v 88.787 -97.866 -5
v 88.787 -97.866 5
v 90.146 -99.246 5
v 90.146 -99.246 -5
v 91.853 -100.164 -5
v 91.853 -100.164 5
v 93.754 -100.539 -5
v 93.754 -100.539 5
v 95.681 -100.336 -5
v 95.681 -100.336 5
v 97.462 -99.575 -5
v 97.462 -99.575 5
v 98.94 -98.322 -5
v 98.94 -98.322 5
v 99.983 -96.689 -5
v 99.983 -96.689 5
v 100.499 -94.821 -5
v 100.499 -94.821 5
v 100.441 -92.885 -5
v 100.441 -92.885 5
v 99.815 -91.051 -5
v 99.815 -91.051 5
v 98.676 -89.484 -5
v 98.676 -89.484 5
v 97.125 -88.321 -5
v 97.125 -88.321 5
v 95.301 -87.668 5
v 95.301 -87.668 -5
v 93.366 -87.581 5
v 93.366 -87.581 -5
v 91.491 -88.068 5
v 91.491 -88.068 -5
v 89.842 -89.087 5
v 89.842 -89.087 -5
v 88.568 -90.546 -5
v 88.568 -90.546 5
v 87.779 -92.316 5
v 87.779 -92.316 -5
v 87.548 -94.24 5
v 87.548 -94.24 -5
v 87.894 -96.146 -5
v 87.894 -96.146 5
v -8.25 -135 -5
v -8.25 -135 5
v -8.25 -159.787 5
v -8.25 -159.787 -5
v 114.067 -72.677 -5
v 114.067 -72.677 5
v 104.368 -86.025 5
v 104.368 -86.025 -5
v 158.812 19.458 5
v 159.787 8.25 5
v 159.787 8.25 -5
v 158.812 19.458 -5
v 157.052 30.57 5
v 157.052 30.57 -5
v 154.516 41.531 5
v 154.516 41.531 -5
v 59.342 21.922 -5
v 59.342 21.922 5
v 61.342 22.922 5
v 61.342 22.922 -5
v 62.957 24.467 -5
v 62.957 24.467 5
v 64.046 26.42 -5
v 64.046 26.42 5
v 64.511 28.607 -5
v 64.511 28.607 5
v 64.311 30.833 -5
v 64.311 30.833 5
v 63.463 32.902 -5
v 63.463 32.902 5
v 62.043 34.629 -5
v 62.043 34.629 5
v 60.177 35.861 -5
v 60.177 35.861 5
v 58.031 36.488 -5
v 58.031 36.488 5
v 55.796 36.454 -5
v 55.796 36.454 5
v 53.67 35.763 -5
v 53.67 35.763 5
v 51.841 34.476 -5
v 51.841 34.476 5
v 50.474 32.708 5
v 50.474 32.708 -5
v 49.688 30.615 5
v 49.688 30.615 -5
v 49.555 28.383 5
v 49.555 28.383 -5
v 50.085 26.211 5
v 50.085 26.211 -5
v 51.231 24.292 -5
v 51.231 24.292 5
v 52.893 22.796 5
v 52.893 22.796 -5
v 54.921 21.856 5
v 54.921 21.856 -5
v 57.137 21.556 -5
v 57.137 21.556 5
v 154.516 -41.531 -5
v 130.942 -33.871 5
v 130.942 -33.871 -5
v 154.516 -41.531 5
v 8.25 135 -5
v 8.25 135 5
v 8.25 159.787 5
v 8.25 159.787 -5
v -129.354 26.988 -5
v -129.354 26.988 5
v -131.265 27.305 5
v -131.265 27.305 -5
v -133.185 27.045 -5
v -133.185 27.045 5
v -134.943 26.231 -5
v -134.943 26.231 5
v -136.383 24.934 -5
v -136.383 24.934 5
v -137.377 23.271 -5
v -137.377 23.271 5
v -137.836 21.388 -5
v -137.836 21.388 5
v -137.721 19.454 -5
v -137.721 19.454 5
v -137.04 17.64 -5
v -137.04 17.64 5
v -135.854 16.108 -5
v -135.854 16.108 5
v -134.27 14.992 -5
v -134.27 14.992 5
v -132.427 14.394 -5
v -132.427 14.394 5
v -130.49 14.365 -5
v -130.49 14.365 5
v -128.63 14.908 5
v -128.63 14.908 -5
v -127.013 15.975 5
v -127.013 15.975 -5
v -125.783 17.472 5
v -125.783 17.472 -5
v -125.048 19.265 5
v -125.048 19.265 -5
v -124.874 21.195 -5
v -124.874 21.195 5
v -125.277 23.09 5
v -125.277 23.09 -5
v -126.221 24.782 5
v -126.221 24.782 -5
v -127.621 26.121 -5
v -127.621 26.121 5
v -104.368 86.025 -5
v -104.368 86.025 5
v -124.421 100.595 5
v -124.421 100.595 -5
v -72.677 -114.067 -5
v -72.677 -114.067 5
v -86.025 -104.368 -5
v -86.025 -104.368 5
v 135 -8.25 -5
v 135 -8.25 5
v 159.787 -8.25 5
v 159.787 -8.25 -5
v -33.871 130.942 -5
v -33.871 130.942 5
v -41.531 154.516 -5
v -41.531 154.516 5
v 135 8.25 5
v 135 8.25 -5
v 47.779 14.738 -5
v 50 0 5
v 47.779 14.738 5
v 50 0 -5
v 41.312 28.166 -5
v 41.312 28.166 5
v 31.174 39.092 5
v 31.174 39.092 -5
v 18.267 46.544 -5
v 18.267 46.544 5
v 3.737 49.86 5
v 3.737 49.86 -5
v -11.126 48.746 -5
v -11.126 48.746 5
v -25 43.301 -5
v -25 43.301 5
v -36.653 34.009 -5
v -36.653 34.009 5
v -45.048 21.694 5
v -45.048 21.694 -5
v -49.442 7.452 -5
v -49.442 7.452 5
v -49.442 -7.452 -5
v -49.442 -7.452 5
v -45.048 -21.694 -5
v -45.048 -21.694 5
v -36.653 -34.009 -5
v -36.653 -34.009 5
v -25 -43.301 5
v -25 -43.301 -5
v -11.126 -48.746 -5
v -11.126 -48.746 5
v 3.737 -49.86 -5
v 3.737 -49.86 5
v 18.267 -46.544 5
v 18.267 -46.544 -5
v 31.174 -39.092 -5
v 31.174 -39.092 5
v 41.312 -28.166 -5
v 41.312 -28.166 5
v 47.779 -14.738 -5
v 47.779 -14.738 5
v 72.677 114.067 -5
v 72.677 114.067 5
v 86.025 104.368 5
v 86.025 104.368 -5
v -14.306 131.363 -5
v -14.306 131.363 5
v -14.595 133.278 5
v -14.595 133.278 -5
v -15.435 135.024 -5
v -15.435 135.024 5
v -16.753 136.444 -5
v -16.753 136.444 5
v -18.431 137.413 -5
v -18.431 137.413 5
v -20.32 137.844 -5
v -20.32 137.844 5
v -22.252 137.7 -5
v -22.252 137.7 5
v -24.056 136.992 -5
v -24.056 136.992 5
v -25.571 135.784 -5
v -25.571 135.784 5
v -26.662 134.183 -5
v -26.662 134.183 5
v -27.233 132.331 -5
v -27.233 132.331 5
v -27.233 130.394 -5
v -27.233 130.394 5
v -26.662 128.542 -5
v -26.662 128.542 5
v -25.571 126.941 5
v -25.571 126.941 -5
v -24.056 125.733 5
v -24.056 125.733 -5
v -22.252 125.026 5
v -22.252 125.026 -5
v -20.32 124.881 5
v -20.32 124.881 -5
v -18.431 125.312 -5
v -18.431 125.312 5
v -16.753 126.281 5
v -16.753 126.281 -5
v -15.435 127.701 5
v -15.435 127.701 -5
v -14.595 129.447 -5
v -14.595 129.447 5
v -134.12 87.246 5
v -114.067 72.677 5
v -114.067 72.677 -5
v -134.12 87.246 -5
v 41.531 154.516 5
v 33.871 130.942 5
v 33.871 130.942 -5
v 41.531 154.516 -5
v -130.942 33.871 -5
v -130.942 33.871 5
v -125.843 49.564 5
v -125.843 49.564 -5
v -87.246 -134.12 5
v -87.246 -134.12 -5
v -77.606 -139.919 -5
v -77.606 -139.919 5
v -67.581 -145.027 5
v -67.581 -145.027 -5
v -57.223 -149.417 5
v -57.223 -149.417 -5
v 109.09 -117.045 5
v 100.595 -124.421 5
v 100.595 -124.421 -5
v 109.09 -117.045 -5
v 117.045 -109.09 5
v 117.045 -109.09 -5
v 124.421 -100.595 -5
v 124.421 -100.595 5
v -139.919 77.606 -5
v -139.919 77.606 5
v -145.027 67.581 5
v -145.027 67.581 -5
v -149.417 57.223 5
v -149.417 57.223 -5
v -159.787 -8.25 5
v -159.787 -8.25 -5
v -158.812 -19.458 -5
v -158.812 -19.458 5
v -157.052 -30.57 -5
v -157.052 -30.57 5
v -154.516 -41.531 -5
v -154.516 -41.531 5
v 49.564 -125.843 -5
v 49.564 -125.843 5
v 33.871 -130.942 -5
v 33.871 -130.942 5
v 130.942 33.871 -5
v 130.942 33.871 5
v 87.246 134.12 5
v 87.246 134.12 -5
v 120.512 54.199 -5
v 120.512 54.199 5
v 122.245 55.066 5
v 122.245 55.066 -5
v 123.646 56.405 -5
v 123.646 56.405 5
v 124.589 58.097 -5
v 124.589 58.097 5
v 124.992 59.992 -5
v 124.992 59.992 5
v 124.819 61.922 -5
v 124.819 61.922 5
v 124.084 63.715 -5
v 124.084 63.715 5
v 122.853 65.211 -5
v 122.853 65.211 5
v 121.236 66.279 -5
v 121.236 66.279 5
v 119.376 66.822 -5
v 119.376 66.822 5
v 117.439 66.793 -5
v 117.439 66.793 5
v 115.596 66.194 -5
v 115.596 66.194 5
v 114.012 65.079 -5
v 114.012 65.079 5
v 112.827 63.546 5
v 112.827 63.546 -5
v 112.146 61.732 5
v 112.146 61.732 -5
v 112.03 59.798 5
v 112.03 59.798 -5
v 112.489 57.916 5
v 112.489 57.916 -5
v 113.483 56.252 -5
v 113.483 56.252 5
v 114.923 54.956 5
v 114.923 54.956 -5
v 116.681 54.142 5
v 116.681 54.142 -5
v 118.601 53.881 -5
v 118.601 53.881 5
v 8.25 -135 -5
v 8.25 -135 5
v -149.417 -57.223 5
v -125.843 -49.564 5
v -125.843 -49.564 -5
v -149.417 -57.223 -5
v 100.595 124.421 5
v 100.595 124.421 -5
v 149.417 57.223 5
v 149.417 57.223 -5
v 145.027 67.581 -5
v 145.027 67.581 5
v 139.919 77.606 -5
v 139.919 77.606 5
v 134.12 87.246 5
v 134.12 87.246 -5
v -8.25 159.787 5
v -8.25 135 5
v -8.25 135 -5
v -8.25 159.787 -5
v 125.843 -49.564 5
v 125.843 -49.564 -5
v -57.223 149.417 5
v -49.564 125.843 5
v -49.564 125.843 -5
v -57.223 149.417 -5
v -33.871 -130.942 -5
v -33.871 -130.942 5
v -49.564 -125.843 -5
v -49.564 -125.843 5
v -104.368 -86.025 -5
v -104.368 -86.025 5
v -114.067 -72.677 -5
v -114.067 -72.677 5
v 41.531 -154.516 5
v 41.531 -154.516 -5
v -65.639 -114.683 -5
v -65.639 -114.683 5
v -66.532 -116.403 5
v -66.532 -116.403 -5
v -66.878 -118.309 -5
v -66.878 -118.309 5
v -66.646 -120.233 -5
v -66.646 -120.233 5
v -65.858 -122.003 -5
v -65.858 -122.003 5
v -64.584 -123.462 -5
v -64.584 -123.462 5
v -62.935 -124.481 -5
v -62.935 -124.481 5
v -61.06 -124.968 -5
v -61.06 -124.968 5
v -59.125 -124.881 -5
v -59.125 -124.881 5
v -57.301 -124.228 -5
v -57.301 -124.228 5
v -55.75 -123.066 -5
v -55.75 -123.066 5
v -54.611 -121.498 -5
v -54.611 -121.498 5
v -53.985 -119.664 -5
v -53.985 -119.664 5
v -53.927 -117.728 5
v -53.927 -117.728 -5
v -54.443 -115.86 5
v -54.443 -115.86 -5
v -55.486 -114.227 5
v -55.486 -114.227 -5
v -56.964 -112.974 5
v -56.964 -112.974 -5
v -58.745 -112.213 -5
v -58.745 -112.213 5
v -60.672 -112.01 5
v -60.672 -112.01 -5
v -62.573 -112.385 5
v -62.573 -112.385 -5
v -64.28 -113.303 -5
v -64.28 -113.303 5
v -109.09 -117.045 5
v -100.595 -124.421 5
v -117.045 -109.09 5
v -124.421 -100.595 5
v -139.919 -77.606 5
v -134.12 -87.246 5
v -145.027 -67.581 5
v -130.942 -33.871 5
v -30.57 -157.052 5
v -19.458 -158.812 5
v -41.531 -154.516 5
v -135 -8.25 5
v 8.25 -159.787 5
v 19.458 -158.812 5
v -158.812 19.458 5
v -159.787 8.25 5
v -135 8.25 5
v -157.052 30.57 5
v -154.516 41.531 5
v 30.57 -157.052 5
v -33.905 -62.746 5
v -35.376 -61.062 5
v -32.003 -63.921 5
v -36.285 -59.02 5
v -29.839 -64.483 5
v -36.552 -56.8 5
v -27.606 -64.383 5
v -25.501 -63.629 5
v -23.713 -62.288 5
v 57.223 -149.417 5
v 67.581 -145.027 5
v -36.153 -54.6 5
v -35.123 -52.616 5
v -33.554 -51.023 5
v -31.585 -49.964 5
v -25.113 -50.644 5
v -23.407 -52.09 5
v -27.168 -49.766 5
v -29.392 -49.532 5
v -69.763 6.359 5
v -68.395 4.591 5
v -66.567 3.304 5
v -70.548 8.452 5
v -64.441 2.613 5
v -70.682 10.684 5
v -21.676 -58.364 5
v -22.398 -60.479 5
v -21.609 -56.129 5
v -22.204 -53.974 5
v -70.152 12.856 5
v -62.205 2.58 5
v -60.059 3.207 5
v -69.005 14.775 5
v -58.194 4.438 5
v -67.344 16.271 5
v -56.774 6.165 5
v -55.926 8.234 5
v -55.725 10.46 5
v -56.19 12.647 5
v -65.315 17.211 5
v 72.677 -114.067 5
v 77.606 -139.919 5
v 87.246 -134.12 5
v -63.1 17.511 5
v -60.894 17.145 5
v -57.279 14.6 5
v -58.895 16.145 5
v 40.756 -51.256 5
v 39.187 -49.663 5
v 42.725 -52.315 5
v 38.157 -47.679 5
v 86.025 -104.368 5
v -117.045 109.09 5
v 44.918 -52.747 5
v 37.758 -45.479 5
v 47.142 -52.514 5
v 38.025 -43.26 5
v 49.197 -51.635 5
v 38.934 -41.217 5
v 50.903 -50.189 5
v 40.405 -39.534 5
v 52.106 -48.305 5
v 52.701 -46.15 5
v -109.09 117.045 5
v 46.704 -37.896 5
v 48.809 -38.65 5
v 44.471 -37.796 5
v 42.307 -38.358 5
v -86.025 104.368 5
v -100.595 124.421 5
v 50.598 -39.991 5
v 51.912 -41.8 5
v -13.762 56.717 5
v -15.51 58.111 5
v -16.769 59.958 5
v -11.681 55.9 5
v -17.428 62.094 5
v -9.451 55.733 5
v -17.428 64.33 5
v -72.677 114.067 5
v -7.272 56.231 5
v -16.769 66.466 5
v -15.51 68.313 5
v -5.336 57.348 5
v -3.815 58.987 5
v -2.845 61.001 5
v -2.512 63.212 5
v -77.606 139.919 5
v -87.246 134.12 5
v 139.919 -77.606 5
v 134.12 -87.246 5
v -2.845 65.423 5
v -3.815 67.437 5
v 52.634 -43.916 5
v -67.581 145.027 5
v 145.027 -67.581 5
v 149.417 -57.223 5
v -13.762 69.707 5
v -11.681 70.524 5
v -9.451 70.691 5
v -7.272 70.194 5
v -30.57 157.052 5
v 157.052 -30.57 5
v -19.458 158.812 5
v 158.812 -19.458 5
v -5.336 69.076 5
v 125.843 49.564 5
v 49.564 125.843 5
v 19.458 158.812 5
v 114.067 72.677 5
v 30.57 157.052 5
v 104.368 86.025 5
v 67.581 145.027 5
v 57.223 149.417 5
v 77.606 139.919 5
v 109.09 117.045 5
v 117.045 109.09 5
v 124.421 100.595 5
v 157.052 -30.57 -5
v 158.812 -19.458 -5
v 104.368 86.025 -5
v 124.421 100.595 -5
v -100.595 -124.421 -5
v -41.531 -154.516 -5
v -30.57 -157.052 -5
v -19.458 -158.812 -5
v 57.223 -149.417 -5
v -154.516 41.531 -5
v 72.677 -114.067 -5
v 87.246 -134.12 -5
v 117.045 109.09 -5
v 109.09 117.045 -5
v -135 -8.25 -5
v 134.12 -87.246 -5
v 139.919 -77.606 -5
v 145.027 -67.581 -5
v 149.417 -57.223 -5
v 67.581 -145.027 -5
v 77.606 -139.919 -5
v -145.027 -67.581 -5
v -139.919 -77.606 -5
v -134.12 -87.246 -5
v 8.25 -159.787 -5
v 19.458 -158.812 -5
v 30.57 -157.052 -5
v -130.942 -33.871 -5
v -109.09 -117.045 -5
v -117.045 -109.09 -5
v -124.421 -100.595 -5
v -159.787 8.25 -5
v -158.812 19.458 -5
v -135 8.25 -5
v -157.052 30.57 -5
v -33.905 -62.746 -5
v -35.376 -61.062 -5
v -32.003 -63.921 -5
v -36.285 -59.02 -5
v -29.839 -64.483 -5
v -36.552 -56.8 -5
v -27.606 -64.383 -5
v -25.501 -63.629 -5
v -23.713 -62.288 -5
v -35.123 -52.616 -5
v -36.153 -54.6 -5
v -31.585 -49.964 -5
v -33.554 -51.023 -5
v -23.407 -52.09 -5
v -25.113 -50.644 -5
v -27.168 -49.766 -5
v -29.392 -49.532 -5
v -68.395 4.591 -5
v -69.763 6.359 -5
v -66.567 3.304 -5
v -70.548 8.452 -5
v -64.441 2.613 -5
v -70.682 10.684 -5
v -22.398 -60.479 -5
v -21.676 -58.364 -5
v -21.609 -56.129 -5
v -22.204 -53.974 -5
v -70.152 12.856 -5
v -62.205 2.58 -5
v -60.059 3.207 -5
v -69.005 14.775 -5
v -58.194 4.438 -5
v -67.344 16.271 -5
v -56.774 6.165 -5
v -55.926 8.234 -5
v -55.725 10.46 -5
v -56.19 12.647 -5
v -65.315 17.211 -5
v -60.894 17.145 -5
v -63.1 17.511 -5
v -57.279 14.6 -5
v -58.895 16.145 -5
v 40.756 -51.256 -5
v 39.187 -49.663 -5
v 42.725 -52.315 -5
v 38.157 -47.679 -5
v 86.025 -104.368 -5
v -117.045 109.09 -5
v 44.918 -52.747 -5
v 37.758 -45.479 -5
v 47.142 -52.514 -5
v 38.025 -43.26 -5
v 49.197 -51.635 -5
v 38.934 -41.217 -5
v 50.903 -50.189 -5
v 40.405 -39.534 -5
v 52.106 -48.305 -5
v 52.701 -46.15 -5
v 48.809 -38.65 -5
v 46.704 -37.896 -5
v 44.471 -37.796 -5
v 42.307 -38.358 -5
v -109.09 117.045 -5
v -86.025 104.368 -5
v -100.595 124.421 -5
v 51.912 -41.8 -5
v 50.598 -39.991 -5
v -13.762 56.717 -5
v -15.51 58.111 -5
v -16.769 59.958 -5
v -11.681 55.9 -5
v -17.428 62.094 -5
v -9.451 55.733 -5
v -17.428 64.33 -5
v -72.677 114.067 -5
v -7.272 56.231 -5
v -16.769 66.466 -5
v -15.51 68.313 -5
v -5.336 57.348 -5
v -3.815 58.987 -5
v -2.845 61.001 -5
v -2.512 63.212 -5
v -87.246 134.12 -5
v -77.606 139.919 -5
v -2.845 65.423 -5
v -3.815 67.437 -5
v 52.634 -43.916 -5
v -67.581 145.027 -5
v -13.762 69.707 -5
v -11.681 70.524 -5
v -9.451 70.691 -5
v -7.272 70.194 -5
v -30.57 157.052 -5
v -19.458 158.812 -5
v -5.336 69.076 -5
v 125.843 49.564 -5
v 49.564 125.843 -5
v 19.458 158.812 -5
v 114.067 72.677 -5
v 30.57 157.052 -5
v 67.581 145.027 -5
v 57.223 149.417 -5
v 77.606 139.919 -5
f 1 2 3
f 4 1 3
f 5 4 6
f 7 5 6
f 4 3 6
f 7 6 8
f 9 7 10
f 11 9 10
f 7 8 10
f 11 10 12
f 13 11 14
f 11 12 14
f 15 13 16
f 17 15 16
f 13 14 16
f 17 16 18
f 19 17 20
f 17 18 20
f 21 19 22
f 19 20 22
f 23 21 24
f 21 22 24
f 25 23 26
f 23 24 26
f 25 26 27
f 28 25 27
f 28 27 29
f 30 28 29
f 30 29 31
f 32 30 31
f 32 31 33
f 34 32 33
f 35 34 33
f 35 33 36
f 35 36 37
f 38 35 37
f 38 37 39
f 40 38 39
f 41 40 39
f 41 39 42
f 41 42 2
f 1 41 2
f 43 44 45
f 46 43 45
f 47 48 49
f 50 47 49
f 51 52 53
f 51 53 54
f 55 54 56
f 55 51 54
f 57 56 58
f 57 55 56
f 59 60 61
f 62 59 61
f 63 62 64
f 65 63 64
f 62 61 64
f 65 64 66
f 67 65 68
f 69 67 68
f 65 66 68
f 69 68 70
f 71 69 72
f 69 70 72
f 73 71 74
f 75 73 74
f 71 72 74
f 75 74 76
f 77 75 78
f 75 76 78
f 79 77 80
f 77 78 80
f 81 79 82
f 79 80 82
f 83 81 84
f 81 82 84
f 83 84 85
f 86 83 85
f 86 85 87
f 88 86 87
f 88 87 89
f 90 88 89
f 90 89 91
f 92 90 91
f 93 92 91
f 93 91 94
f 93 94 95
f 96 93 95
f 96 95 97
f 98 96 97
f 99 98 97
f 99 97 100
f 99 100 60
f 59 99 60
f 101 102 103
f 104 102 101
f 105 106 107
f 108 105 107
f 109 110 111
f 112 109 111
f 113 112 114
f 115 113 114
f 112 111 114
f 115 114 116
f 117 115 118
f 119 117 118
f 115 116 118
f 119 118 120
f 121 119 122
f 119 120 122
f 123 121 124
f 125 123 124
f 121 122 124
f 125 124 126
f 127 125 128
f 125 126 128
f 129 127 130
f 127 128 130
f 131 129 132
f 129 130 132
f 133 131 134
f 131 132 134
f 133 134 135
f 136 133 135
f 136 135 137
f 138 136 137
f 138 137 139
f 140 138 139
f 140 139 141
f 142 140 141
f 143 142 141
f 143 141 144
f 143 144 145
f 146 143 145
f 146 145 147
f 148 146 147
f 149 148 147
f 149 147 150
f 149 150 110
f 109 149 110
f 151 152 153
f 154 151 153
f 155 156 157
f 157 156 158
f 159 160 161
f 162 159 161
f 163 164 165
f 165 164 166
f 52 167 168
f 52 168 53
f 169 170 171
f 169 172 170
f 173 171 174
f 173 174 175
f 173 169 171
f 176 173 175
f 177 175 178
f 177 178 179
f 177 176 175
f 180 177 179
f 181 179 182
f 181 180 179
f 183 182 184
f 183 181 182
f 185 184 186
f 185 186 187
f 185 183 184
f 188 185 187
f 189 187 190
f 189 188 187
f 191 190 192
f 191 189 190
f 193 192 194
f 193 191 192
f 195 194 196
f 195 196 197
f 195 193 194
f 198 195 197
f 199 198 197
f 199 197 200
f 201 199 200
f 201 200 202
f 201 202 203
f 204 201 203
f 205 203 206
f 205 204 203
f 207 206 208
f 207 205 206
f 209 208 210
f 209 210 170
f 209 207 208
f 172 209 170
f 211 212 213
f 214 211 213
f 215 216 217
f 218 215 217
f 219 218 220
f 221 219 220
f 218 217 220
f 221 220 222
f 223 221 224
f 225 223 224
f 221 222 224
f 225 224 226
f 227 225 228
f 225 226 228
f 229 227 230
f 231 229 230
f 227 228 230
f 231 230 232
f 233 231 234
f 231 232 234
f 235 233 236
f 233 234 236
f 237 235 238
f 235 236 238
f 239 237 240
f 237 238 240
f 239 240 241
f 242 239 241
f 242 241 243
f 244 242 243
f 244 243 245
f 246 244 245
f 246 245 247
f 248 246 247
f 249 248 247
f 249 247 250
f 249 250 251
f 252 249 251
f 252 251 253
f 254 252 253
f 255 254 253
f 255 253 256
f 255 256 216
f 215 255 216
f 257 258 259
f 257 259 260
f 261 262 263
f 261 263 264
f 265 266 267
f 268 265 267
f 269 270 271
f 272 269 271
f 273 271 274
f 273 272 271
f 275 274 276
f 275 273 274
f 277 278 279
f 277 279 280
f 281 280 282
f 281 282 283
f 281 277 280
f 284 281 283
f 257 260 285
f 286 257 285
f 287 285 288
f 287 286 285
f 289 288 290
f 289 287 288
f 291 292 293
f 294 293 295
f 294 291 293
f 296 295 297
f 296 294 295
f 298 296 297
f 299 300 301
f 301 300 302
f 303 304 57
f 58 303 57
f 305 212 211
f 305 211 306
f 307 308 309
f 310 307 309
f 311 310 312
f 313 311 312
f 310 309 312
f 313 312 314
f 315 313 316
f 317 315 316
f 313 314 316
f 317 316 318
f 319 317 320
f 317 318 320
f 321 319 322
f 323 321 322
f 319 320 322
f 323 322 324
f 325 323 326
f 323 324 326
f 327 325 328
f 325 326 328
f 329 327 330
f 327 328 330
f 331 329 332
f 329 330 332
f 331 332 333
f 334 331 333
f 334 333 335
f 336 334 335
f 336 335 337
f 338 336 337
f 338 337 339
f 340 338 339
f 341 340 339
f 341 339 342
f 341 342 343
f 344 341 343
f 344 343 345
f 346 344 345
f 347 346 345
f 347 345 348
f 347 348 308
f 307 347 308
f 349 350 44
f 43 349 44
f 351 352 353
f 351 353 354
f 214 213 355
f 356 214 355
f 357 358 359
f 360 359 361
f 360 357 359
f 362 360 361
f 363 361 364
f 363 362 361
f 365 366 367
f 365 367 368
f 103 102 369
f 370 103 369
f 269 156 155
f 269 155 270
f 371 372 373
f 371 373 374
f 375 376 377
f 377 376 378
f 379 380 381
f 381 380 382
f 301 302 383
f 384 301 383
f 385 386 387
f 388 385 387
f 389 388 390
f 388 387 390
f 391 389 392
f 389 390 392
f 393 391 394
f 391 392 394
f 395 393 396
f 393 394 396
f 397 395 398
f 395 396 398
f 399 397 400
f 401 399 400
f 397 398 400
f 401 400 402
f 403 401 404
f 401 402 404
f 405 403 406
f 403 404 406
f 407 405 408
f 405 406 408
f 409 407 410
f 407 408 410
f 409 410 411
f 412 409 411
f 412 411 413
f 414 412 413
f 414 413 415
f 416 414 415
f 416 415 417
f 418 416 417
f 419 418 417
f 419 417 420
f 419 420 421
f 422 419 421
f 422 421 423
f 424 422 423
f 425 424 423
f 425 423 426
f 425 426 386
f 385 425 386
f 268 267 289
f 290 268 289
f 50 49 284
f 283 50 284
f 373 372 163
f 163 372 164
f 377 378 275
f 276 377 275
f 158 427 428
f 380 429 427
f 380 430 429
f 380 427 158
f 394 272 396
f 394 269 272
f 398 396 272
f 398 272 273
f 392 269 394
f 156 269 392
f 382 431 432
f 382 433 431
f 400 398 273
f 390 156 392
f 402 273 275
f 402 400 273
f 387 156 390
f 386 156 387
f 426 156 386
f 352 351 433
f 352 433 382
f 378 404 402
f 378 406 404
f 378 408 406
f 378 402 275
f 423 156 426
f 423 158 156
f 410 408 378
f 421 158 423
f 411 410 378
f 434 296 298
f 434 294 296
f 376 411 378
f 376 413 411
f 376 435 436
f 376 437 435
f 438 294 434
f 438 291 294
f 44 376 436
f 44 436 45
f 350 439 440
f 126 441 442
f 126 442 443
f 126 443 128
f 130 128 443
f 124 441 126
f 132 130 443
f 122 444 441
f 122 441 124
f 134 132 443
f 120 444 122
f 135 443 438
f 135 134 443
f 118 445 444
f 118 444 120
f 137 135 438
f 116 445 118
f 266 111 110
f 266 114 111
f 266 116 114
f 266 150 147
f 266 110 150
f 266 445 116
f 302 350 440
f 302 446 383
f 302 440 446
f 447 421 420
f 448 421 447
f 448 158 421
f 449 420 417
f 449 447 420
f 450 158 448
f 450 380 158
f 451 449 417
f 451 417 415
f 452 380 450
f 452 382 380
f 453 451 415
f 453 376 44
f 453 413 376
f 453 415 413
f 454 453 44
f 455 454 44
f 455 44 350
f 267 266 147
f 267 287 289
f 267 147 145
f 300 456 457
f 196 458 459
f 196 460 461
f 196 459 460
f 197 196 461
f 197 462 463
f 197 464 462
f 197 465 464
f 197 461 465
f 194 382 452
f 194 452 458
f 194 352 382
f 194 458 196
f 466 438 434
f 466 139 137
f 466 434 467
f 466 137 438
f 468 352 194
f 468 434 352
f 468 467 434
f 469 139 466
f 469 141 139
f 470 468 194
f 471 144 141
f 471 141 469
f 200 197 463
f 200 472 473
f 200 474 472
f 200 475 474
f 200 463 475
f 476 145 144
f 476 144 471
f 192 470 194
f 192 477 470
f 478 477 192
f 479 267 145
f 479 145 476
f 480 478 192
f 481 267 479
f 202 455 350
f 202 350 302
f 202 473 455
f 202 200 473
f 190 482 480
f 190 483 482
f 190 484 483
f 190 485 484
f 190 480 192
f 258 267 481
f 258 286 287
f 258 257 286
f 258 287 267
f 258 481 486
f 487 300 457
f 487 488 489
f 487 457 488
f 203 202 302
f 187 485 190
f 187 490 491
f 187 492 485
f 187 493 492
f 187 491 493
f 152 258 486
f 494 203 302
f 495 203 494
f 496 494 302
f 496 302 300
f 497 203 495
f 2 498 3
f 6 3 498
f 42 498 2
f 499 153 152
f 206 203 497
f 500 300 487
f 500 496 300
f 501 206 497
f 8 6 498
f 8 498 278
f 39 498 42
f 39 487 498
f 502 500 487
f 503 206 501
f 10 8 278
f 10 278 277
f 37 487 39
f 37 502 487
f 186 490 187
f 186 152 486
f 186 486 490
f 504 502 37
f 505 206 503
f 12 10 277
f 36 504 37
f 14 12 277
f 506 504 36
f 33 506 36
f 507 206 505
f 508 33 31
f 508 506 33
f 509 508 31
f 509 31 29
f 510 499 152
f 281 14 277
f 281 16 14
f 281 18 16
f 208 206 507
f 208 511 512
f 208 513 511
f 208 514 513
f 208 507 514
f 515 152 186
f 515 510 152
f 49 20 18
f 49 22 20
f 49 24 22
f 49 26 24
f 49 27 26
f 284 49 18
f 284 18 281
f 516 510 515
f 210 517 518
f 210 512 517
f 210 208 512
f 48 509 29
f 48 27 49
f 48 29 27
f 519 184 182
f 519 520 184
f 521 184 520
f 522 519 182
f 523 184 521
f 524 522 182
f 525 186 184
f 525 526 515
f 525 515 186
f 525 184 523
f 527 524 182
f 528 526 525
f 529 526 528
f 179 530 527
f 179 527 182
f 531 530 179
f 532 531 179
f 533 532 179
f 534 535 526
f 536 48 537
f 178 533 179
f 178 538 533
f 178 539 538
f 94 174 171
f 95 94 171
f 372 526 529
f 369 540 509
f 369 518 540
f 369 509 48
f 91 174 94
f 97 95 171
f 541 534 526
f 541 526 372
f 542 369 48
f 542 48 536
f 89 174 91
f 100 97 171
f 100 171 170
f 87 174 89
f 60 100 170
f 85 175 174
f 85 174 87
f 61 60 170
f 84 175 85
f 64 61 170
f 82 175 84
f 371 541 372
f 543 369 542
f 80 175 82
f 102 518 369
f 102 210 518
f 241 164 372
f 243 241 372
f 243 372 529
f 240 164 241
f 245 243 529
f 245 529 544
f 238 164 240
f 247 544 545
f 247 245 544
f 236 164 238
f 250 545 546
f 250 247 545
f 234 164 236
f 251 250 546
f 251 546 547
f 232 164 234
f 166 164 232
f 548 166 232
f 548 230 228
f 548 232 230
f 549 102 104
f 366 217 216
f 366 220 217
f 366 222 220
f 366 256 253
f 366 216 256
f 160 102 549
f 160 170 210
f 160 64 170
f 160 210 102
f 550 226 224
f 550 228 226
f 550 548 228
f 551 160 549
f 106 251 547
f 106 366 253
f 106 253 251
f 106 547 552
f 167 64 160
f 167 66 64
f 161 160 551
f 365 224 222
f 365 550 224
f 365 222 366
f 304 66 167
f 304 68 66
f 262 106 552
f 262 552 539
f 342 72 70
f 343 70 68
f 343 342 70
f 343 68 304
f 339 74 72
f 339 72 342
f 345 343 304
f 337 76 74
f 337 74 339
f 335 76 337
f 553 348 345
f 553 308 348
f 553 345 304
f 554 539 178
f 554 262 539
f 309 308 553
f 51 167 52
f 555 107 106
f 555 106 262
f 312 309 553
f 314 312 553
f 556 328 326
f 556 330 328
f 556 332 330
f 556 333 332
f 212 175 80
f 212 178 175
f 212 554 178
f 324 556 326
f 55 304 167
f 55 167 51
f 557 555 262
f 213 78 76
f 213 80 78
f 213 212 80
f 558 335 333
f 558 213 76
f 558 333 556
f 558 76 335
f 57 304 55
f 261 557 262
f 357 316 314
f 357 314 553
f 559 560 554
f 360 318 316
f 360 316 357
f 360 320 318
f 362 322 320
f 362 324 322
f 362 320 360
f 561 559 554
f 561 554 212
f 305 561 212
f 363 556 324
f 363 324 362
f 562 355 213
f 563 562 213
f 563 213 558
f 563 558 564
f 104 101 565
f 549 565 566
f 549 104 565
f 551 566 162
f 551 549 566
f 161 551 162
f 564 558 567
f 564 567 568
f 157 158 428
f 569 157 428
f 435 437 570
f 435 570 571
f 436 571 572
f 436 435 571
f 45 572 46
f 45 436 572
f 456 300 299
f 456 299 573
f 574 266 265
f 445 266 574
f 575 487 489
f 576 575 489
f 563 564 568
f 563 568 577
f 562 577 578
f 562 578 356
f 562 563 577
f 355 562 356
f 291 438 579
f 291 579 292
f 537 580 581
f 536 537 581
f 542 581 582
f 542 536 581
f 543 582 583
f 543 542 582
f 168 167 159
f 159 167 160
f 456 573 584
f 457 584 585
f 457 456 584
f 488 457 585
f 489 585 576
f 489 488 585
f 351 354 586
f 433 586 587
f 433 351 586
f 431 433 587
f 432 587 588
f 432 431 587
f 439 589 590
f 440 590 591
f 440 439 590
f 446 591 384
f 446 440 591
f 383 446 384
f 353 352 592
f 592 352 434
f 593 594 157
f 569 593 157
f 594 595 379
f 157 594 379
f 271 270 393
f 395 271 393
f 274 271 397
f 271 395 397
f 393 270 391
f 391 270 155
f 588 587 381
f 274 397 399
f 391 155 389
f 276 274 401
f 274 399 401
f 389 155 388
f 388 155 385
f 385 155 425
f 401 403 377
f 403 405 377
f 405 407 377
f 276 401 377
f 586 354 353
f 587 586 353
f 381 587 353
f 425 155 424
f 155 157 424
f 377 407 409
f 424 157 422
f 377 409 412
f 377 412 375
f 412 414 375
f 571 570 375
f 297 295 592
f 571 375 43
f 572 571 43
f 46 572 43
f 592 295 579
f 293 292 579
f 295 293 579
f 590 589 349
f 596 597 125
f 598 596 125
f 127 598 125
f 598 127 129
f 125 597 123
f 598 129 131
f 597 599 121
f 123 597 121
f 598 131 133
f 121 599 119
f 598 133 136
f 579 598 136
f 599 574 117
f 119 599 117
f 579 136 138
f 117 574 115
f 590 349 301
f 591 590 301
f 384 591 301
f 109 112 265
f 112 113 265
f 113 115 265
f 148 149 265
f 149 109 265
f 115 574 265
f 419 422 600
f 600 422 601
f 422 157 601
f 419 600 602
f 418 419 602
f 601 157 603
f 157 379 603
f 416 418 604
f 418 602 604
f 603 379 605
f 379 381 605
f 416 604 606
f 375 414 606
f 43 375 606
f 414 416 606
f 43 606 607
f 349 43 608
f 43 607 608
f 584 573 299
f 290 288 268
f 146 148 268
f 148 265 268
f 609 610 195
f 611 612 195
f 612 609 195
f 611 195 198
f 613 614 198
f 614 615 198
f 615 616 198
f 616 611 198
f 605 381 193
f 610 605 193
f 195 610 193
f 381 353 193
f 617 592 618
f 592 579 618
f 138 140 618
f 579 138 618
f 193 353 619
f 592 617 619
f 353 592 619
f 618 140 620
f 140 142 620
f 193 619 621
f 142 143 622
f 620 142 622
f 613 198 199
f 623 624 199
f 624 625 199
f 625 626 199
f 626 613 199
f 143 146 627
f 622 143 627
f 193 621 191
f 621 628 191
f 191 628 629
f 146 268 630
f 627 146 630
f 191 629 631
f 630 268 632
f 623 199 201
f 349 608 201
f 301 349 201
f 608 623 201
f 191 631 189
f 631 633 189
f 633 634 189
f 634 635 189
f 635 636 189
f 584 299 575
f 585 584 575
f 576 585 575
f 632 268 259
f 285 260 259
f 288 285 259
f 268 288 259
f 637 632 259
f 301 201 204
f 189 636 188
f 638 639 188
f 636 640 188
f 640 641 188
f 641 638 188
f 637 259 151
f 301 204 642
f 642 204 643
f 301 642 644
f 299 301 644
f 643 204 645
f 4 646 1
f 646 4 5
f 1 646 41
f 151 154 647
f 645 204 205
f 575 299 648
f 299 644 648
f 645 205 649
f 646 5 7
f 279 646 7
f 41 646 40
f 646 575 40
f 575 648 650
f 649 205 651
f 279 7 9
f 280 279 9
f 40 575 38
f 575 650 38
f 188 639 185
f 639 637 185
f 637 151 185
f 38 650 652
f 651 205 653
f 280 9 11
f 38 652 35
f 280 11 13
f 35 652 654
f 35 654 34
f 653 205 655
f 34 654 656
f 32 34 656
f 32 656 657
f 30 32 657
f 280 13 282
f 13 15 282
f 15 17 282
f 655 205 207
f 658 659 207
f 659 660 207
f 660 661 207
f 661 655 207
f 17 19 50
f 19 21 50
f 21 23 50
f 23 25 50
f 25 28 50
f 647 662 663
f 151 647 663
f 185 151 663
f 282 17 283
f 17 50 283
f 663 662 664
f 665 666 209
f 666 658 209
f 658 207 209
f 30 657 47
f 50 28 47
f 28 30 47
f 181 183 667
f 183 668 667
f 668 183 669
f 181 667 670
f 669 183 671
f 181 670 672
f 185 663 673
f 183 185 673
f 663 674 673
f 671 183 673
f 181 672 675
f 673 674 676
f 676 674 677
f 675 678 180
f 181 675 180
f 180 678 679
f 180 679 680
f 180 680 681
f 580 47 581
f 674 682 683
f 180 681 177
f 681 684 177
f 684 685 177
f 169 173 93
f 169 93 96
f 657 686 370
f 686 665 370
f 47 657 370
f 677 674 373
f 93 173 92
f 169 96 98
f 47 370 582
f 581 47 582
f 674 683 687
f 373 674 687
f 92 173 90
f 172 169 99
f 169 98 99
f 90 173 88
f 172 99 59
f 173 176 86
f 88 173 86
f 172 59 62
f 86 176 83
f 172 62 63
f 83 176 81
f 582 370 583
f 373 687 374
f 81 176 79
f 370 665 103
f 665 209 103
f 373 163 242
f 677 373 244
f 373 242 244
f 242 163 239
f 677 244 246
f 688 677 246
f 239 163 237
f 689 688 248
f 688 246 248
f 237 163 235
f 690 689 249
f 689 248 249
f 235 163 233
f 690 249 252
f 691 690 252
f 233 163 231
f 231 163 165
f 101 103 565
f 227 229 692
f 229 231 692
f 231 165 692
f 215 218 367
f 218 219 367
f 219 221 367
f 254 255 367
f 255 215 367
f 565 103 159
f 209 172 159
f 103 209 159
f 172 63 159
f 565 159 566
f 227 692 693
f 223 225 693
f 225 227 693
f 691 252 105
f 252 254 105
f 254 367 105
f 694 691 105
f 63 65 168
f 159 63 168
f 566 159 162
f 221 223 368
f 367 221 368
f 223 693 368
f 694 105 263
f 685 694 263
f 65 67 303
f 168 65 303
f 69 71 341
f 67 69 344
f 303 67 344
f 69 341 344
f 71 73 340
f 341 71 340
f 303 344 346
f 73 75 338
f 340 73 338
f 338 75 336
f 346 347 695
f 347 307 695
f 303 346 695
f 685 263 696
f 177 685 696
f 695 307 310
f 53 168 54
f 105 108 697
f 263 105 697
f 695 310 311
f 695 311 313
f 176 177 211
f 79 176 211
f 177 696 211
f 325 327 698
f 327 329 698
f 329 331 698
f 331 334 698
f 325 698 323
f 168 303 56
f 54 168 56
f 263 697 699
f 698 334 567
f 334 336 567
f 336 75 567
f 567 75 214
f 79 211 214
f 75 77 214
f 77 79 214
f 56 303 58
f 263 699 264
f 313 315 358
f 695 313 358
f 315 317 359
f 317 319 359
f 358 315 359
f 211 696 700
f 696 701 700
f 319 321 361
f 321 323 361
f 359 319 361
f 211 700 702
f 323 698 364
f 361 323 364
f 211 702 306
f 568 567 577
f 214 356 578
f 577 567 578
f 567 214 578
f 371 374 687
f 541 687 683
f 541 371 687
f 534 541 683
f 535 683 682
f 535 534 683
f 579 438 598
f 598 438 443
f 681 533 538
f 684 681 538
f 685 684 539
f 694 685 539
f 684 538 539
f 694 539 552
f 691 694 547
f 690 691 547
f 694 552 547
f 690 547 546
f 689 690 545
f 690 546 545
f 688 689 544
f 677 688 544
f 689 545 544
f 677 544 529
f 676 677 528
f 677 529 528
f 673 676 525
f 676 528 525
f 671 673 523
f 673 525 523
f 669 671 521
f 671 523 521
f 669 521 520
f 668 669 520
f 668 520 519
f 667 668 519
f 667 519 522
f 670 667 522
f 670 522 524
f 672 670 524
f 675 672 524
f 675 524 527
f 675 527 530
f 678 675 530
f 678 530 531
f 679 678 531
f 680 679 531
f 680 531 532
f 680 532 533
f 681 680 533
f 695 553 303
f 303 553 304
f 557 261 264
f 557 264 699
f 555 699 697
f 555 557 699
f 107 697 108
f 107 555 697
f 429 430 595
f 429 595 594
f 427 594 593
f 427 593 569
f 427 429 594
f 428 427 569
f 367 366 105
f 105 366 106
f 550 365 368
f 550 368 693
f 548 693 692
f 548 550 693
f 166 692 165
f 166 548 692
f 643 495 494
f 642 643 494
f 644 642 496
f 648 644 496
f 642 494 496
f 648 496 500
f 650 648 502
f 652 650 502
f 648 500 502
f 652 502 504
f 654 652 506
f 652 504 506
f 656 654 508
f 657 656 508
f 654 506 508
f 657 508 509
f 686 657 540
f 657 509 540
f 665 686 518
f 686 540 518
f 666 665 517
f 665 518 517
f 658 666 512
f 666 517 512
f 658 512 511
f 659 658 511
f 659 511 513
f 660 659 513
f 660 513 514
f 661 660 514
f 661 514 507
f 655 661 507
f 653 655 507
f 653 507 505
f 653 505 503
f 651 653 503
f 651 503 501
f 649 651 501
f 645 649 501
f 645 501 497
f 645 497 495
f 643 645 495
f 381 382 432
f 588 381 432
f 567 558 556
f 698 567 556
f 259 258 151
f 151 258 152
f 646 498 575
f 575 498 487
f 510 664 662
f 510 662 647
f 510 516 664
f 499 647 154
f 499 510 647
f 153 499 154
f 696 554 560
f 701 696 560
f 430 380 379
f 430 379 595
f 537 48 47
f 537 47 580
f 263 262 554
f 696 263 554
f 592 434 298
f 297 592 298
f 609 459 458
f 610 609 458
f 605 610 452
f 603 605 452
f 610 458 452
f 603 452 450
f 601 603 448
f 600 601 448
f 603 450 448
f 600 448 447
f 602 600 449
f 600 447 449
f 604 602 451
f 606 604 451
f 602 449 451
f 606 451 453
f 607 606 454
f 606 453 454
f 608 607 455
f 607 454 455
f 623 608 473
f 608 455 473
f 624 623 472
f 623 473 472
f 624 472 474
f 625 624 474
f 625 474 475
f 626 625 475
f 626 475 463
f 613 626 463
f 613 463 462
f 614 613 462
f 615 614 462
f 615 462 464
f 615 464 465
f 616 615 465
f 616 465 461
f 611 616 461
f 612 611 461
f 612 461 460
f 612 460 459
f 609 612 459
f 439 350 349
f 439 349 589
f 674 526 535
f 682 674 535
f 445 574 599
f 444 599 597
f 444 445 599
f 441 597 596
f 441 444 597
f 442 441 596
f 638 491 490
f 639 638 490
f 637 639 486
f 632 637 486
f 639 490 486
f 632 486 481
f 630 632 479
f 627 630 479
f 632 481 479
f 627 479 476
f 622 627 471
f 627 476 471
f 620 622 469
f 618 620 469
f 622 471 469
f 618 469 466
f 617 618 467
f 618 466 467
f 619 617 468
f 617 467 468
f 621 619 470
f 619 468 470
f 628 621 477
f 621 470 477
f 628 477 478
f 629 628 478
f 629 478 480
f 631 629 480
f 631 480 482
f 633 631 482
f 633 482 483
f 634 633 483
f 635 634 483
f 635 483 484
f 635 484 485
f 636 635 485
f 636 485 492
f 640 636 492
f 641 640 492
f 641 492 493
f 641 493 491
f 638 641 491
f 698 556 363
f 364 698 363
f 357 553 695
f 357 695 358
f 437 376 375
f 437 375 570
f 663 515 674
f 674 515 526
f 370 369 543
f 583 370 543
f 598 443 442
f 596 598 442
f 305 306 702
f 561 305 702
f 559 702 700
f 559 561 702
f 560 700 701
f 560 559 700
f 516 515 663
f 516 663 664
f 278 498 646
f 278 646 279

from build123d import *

# Parameters (mm, degrees)
ESQUISSE1_R                  = 160
ESQUISSE1_R_2                = 50
BOSS_EXTRU_1_DEPTH           = 5
ESQUISSE2_R                  = 7.5
ENL_V_MAT_EXTRU_1_DEPTH      = 11
ESQUISSE3_W                  = 16.5
ESQUISSE3_H                  = 25
ENL_V_MAT_EXTRU_2_DEPTH      = 11
ESQUISSE4_R                  = 6.5
ENL_V_MAT_EXTRU_3_DEPTH      = 11
R_P_TITION_CIRCULAIRE1_COUNT = 5
R_P_TITION_CIRCULAIRE2_COUNT = 20


with BuildPart() as part:
    # Esquisse1 → Boss.-Extru.1 (new body, symmetric)
    with BuildSketch(Plane.XY):
        Circle(ESQUISSE1_R)
        Circle(ESQUISSE1_R_2, mode=Mode.SUBTRACT)
    extrude(amount=BOSS_EXTRU_1_DEPTH, both=True)

    # Esquisse2 → Enlèv. mat.-Extru.1 (cut, through all)
    with BuildSketch(Plane.XY.offset(5)):
        with Locations((-10.011805763, 63.212053798)):
            Circle(ESQUISSE2_R)
    enl_v_mat_extru_1 = extrude(amount=-ENL_V_MAT_EXTRU_1_DEPTH, mode=Mode.SUBTRACT)

    # Esquisse3 → Enlèv. mat.-Extru.2 (cut, through all)
    with BuildSketch(Plane.XY.offset(5)):
        with Locations((0, 147.5)):
            Rectangle(ESQUISSE3_W, ESQUISSE3_H)
    enl_v_mat_extru_2 = extrude(amount=-ENL_V_MAT_EXTRU_2_DEPTH, mode=Mode.SUBTRACT)

    # Esquisse4 → Enlèv. mat.-Extru.3 (cut, through all)
    with BuildSketch(Plane.XY.offset(5)):
        with Locations((-20.80578385, 131.362549299)):
            Circle(ESQUISSE4_R)
    enl_v_mat_extru_3 = extrude(amount=-ENL_V_MAT_EXTRU_3_DEPTH, mode=Mode.SUBTRACT)

    # Répétition circulaire1: Enlèv. mat.-Extru.1, Enlèv. mat.-Extru.3 ×5 about axis
    r_p_tition_circulaire1_axis = Axis((0, 0, 0), (0, 0, 1))
    add([enl_v_mat_extru_1.rotate(r_p_tition_circulaire1_axis, i * 360 / R_P_TITION_CIRCULAIRE1_COUNT) for i in range(1, R_P_TITION_CIRCULAIRE1_COUNT)], mode=Mode.SUBTRACT)
    add([enl_v_mat_extru_3.rotate(r_p_tition_circulaire1_axis, i * 360 / R_P_TITION_CIRCULAIRE1_COUNT) for i in range(1, R_P_TITION_CIRCULAIRE1_COUNT)], mode=Mode.SUBTRACT)

    # Répétition circulaire2: Enlèv. mat.-Extru.2 ×20 about axis
    r_p_tition_circulaire2_axis = Axis((0, 0, 0), (0, 0, 1))
    for i in range(1, R_P_TITION_CIRCULAIRE2_COUNT):
        add(enl_v_mat_extru_2.rotate(r_p_tition_circulaire2_axis, i * 360 / R_P_TITION_CIRCULAIRE2_COUNT), mode=Mode.SUBTRACT)


solid = part.part
